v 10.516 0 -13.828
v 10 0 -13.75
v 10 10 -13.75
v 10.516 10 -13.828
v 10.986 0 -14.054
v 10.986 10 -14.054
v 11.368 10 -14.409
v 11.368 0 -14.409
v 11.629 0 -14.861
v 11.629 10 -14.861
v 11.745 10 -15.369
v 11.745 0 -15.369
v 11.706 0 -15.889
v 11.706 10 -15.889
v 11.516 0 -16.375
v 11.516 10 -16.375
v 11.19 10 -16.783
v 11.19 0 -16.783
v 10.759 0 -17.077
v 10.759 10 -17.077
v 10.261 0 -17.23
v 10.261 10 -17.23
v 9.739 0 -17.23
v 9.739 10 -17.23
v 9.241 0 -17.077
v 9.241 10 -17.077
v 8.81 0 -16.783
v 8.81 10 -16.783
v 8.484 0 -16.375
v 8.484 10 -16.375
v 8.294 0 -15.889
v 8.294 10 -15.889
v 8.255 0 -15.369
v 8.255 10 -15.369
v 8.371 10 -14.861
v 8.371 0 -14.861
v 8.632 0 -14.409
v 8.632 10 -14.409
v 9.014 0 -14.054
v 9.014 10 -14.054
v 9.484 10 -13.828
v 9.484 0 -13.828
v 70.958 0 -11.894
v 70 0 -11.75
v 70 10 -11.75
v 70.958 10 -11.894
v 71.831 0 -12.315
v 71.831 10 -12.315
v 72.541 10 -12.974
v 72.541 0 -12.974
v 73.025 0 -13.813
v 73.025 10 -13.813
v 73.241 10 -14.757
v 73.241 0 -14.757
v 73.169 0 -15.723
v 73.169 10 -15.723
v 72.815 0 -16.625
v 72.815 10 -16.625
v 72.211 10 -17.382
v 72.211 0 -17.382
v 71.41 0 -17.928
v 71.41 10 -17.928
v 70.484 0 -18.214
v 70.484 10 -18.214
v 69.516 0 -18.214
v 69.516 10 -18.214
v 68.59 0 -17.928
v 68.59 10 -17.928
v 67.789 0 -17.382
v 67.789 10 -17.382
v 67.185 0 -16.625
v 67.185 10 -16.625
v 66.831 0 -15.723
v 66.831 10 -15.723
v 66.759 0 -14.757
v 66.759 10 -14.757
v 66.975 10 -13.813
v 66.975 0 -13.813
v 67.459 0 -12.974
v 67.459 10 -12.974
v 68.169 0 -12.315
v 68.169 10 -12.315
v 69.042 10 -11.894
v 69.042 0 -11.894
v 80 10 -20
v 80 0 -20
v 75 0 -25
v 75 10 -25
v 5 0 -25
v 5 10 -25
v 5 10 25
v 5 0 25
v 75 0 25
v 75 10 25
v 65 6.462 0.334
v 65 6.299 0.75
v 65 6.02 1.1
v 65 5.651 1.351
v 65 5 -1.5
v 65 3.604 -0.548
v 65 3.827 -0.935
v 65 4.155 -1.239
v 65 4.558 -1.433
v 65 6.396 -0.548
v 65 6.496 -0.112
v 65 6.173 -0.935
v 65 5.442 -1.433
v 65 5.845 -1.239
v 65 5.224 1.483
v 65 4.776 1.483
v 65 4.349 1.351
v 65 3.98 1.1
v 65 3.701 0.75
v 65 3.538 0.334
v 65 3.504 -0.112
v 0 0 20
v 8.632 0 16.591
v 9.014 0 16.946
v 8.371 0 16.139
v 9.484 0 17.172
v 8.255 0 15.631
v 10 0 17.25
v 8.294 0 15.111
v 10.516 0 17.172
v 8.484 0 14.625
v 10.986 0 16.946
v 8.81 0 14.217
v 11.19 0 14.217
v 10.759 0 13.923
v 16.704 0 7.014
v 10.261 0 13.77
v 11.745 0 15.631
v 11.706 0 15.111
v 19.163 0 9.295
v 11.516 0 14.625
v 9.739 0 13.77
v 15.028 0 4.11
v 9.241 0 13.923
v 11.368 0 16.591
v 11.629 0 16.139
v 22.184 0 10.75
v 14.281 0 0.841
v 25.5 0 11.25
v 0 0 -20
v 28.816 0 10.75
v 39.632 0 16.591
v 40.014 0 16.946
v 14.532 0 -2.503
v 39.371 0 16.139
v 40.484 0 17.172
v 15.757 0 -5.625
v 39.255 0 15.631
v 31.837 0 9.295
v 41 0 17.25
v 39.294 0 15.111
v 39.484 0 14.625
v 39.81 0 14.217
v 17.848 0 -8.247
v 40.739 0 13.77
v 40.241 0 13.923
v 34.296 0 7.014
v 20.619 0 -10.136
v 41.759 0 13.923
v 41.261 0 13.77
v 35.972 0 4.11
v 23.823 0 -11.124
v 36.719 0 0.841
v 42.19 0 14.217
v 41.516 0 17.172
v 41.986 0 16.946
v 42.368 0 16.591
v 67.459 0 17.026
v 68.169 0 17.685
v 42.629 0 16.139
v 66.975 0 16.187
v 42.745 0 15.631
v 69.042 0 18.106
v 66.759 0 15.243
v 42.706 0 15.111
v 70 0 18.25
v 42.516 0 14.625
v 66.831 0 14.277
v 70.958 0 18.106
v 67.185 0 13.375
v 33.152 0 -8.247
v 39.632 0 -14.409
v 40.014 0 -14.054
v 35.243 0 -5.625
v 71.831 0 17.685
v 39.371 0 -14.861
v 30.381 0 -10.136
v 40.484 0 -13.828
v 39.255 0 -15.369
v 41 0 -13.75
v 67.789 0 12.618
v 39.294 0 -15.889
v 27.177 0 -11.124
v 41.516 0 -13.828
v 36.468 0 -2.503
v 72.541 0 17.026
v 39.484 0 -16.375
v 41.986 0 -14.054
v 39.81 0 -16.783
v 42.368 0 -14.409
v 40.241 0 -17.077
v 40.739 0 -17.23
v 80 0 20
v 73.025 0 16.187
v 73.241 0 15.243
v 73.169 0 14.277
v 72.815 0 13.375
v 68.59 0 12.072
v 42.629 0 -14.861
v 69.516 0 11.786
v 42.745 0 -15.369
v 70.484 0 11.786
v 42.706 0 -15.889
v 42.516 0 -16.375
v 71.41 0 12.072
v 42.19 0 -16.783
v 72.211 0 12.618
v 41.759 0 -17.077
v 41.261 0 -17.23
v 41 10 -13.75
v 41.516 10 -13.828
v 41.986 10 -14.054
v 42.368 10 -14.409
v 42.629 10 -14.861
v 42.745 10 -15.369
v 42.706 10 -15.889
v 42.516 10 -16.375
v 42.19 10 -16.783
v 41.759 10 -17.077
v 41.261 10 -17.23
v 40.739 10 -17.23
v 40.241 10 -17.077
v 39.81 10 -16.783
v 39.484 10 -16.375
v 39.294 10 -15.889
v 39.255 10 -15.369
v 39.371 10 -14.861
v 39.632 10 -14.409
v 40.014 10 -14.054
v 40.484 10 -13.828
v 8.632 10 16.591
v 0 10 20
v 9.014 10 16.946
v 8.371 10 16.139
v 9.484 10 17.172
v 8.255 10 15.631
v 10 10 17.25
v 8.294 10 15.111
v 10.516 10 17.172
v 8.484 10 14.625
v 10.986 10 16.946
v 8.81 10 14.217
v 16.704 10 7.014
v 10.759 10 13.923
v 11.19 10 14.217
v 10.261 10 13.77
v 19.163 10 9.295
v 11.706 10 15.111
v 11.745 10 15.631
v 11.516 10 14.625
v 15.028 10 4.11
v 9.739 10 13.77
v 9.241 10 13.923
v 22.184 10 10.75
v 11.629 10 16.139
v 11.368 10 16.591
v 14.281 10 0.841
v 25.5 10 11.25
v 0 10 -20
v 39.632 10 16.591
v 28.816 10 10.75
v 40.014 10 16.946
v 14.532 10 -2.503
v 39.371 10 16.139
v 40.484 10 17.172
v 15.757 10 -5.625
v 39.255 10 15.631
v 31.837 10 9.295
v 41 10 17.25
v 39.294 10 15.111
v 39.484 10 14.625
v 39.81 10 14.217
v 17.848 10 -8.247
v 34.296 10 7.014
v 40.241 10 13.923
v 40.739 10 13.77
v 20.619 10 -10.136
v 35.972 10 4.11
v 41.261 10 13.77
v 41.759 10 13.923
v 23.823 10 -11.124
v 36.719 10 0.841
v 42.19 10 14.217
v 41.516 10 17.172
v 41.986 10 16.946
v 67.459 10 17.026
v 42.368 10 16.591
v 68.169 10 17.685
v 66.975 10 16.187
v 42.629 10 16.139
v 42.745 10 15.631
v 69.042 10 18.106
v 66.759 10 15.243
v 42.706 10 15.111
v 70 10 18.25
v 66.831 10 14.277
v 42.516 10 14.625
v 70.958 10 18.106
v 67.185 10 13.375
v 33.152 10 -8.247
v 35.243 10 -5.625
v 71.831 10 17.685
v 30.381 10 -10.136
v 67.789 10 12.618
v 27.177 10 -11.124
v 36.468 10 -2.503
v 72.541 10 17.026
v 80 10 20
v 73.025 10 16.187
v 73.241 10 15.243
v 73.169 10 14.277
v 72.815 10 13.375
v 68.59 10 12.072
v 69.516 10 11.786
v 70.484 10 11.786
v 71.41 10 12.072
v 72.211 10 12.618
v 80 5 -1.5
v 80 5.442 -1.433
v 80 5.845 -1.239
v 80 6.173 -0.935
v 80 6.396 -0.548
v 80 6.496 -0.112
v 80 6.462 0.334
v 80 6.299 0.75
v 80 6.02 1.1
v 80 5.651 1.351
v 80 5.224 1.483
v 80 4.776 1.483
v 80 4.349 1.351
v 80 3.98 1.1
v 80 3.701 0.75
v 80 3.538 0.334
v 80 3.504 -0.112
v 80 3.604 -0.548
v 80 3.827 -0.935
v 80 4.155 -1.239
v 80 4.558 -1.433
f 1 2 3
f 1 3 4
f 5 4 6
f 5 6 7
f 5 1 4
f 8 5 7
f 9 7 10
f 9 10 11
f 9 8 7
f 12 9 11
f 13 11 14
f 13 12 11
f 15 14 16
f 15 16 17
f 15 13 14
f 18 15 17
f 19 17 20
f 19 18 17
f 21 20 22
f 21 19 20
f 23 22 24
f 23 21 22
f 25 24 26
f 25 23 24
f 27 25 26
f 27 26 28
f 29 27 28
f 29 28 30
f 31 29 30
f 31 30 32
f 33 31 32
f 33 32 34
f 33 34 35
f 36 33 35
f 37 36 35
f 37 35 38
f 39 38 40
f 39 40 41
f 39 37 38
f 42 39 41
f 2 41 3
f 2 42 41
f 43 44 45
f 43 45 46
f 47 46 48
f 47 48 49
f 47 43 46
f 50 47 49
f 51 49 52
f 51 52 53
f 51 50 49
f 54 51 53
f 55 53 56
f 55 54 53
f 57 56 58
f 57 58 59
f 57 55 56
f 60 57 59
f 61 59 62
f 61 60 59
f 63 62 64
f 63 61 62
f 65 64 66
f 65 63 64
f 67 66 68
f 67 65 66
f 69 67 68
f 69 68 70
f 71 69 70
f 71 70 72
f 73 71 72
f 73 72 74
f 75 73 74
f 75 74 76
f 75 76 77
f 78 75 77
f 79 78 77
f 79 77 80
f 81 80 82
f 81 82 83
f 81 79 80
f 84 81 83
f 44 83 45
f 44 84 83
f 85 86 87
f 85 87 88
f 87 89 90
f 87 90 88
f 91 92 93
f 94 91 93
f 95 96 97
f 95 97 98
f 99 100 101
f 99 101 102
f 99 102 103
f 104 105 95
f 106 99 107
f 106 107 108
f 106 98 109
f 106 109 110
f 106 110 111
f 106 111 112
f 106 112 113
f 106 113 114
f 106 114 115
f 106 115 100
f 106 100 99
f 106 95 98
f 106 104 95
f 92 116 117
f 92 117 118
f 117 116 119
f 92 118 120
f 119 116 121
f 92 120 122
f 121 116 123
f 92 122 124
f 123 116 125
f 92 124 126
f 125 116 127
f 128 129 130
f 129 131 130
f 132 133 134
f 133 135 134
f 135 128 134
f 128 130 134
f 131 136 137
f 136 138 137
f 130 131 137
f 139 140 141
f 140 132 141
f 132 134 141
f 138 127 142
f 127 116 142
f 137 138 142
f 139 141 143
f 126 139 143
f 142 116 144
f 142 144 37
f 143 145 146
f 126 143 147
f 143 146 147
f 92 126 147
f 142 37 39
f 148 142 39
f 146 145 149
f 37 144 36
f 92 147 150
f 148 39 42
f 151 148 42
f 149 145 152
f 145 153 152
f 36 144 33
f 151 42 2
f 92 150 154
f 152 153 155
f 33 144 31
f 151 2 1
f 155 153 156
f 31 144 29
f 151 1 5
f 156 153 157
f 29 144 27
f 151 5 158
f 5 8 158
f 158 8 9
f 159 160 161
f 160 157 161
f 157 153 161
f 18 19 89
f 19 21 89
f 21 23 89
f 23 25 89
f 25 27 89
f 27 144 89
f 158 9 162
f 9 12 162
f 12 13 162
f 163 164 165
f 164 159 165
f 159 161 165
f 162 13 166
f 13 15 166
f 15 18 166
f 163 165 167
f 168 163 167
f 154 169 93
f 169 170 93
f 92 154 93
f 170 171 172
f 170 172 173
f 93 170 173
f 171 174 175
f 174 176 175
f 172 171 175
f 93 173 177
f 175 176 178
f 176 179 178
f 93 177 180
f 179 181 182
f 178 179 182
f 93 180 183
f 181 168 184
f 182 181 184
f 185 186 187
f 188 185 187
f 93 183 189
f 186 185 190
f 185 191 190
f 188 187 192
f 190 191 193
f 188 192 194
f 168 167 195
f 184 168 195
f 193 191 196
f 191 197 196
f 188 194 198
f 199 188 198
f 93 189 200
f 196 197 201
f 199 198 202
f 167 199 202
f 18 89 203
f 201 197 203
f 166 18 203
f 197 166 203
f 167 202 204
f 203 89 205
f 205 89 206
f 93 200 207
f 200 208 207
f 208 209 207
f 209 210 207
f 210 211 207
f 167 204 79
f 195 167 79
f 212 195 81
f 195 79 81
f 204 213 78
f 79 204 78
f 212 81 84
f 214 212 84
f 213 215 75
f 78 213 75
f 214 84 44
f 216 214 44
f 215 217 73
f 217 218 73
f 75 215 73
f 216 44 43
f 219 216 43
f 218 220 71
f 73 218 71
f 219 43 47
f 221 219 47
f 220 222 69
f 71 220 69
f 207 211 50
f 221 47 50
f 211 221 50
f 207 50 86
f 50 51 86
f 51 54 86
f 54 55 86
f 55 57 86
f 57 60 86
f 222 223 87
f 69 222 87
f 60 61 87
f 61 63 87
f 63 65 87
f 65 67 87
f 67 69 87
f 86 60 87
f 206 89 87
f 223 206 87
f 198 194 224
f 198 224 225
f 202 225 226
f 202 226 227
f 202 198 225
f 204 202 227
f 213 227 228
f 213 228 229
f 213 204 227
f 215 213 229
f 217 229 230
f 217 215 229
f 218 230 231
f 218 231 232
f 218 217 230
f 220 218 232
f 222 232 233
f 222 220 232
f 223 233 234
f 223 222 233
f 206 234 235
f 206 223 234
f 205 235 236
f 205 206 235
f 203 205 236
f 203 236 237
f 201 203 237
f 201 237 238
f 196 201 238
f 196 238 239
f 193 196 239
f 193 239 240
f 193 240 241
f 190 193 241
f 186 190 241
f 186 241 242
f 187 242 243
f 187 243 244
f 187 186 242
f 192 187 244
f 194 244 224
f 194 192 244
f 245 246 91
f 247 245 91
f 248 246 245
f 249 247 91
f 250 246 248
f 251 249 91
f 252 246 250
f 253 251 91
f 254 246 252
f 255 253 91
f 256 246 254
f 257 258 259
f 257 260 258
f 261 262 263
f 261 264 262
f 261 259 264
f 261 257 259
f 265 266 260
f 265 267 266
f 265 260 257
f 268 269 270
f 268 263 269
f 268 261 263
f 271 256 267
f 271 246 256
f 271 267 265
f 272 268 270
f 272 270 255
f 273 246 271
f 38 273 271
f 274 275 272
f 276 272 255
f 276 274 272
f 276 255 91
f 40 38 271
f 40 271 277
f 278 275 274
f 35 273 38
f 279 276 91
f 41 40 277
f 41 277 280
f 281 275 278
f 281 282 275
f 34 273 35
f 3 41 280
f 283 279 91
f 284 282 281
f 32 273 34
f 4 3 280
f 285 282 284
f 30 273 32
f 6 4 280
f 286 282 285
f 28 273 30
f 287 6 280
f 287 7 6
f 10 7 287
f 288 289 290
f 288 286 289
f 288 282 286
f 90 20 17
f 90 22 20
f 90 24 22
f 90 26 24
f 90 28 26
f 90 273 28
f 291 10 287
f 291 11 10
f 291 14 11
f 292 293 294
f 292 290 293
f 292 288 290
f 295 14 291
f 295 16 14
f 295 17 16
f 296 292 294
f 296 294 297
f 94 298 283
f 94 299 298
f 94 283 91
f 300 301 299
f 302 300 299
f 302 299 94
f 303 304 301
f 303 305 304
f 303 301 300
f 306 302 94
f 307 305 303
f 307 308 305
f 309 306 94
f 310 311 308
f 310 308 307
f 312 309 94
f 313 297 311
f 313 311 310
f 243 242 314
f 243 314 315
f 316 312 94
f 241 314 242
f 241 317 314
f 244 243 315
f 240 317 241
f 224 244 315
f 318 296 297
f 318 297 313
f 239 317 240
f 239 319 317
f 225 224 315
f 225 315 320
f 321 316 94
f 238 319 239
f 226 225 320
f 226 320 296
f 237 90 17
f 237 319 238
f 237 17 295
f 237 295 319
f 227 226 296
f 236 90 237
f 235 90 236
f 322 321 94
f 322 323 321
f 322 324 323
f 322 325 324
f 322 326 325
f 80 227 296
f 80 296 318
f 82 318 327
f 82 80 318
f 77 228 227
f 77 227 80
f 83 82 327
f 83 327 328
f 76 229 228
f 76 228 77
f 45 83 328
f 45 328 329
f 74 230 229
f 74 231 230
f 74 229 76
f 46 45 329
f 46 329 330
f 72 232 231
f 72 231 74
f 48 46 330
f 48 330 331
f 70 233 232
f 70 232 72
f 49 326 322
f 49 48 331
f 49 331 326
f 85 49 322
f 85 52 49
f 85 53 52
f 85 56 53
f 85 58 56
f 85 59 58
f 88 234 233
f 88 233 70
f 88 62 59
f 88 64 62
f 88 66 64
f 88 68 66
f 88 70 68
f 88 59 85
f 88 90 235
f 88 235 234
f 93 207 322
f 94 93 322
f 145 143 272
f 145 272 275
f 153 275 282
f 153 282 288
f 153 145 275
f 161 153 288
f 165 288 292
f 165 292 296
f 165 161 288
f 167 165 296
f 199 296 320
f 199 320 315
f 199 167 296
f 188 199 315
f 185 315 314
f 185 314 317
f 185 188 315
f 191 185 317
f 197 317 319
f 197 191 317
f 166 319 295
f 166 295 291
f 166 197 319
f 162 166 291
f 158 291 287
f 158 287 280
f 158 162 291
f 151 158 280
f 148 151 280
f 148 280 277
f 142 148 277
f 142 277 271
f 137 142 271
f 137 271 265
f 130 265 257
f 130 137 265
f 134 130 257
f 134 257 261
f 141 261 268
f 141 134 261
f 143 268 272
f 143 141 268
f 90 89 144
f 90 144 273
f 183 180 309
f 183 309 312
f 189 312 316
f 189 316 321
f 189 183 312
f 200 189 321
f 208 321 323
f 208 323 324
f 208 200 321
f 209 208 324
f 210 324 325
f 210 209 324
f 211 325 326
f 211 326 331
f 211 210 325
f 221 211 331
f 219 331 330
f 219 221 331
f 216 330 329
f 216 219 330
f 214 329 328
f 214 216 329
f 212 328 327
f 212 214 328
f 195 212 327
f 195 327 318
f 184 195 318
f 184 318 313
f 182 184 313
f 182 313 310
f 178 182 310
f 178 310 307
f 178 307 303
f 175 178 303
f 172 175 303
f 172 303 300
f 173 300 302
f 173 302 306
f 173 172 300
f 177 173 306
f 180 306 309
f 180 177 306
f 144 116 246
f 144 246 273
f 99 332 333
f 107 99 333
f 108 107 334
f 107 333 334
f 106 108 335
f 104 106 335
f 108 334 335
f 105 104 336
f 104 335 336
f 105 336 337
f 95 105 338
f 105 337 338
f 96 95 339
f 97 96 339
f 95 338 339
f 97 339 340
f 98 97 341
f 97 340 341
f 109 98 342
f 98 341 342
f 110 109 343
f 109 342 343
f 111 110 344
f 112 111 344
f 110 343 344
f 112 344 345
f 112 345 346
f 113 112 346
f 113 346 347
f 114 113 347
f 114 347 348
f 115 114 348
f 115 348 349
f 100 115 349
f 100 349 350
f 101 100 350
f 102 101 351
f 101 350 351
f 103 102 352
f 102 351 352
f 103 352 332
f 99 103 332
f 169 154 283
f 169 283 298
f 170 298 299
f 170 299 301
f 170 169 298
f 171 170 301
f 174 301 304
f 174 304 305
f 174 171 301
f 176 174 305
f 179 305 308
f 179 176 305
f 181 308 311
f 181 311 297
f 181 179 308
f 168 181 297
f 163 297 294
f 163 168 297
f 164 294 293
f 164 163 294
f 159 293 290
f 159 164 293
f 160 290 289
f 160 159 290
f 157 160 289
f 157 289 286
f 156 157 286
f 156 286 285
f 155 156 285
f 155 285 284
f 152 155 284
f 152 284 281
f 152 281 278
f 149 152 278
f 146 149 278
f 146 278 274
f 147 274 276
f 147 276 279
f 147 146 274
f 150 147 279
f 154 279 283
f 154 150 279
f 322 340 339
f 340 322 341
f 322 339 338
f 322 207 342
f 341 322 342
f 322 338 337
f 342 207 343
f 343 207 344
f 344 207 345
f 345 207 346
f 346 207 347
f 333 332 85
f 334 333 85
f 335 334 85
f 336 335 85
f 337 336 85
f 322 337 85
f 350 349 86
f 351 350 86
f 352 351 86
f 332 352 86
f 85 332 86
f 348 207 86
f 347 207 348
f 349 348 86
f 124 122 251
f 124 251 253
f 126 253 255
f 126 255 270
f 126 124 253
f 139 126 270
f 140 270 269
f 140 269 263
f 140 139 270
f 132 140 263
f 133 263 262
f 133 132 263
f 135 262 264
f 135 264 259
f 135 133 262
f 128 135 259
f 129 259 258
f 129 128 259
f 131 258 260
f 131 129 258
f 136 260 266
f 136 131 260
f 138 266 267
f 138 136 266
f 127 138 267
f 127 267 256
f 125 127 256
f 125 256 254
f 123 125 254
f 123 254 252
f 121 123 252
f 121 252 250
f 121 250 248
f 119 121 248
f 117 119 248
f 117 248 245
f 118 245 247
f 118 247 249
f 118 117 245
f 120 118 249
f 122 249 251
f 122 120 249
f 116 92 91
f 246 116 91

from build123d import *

# Parameters (mm, degrees)
SKETCH1_W           = 80
SKETCH1_H           = 50
SKETCH1_R           = 1.75
SKETCH1_R_2         = 11.25
SKETCH1_R_3         = 3.25
BOSS_EXTRUDE1_DEPTH = 10
SKETCH2_R           = 1.5
CUT_EXTRUDE1_DEPTH  = 15
CHAMFER1_SIZE       = 5


with BuildPart() as part:
    # Sketch1 → Boss-Extrude1 (new body)
    with BuildSketch(Plane(origin=(0, 0, 0), x_dir=(1, 0, 0), z_dir=(0, 1, 0))):
        with Locations((40, 0)):
            Rectangle(SKETCH1_W, SKETCH1_H)
        with Locations(Location((10, 15.5, 0), (0, 0, 270))):
            Circle(SKETCH1_R, mode=Mode.SUBTRACT)
        with Locations(Location((10, -15.5, 0), (0, 0, 270))):
            Circle(SKETCH1_R, mode=Mode.SUBTRACT)
        with Locations(Location((25.5, 0, 0), (0, 0, 270))):
            Circle(SKETCH1_R_2, mode=Mode.SUBTRACT)
        with Locations(Location((41, 15.5, 0), (0, 0, 270))):
            Circle(SKETCH1_R, mode=Mode.SUBTRACT)
        with Locations(Location((41, -15.5, 0), (0, 0, 270))):
            Circle(SKETCH1_R, mode=Mode.SUBTRACT)
        with Locations(Location((70, 15, 0), (0, 0, 270))):
            Circle(SKETCH1_R_3, mode=Mode.SUBTRACT)
        with Locations(Location((70, -15, 0), (0, 0, 270))):
            Circle(SKETCH1_R_3, mode=Mode.SUBTRACT)
    extrude(amount=BOSS_EXTRUDE1_DEPTH)

    # Sketch2 → Cut-Extrude1 (cut)
    with BuildSketch(Plane(origin=(80, 0, 0), x_dir=(0, 0, -1), z_dir=(1, 0, 0))):
        with Locations((0, 5)):
            Circle(SKETCH2_R)
    extrude(amount=-CUT_EXTRUDE1_DEPTH, mode=Mode.SUBTRACT)

    # Chamfer1
    chamfer1_edges = [part.edges().sort_by_distance(p)[0] for p in [
        (0, 5, -25),
        (80, 5, -25),
        (80, 5, 25),
        (0, 5, 25),
    ]]
    chamfer(chamfer1_edges, length=CHAMFER1_SIZE)


solid = part.part
